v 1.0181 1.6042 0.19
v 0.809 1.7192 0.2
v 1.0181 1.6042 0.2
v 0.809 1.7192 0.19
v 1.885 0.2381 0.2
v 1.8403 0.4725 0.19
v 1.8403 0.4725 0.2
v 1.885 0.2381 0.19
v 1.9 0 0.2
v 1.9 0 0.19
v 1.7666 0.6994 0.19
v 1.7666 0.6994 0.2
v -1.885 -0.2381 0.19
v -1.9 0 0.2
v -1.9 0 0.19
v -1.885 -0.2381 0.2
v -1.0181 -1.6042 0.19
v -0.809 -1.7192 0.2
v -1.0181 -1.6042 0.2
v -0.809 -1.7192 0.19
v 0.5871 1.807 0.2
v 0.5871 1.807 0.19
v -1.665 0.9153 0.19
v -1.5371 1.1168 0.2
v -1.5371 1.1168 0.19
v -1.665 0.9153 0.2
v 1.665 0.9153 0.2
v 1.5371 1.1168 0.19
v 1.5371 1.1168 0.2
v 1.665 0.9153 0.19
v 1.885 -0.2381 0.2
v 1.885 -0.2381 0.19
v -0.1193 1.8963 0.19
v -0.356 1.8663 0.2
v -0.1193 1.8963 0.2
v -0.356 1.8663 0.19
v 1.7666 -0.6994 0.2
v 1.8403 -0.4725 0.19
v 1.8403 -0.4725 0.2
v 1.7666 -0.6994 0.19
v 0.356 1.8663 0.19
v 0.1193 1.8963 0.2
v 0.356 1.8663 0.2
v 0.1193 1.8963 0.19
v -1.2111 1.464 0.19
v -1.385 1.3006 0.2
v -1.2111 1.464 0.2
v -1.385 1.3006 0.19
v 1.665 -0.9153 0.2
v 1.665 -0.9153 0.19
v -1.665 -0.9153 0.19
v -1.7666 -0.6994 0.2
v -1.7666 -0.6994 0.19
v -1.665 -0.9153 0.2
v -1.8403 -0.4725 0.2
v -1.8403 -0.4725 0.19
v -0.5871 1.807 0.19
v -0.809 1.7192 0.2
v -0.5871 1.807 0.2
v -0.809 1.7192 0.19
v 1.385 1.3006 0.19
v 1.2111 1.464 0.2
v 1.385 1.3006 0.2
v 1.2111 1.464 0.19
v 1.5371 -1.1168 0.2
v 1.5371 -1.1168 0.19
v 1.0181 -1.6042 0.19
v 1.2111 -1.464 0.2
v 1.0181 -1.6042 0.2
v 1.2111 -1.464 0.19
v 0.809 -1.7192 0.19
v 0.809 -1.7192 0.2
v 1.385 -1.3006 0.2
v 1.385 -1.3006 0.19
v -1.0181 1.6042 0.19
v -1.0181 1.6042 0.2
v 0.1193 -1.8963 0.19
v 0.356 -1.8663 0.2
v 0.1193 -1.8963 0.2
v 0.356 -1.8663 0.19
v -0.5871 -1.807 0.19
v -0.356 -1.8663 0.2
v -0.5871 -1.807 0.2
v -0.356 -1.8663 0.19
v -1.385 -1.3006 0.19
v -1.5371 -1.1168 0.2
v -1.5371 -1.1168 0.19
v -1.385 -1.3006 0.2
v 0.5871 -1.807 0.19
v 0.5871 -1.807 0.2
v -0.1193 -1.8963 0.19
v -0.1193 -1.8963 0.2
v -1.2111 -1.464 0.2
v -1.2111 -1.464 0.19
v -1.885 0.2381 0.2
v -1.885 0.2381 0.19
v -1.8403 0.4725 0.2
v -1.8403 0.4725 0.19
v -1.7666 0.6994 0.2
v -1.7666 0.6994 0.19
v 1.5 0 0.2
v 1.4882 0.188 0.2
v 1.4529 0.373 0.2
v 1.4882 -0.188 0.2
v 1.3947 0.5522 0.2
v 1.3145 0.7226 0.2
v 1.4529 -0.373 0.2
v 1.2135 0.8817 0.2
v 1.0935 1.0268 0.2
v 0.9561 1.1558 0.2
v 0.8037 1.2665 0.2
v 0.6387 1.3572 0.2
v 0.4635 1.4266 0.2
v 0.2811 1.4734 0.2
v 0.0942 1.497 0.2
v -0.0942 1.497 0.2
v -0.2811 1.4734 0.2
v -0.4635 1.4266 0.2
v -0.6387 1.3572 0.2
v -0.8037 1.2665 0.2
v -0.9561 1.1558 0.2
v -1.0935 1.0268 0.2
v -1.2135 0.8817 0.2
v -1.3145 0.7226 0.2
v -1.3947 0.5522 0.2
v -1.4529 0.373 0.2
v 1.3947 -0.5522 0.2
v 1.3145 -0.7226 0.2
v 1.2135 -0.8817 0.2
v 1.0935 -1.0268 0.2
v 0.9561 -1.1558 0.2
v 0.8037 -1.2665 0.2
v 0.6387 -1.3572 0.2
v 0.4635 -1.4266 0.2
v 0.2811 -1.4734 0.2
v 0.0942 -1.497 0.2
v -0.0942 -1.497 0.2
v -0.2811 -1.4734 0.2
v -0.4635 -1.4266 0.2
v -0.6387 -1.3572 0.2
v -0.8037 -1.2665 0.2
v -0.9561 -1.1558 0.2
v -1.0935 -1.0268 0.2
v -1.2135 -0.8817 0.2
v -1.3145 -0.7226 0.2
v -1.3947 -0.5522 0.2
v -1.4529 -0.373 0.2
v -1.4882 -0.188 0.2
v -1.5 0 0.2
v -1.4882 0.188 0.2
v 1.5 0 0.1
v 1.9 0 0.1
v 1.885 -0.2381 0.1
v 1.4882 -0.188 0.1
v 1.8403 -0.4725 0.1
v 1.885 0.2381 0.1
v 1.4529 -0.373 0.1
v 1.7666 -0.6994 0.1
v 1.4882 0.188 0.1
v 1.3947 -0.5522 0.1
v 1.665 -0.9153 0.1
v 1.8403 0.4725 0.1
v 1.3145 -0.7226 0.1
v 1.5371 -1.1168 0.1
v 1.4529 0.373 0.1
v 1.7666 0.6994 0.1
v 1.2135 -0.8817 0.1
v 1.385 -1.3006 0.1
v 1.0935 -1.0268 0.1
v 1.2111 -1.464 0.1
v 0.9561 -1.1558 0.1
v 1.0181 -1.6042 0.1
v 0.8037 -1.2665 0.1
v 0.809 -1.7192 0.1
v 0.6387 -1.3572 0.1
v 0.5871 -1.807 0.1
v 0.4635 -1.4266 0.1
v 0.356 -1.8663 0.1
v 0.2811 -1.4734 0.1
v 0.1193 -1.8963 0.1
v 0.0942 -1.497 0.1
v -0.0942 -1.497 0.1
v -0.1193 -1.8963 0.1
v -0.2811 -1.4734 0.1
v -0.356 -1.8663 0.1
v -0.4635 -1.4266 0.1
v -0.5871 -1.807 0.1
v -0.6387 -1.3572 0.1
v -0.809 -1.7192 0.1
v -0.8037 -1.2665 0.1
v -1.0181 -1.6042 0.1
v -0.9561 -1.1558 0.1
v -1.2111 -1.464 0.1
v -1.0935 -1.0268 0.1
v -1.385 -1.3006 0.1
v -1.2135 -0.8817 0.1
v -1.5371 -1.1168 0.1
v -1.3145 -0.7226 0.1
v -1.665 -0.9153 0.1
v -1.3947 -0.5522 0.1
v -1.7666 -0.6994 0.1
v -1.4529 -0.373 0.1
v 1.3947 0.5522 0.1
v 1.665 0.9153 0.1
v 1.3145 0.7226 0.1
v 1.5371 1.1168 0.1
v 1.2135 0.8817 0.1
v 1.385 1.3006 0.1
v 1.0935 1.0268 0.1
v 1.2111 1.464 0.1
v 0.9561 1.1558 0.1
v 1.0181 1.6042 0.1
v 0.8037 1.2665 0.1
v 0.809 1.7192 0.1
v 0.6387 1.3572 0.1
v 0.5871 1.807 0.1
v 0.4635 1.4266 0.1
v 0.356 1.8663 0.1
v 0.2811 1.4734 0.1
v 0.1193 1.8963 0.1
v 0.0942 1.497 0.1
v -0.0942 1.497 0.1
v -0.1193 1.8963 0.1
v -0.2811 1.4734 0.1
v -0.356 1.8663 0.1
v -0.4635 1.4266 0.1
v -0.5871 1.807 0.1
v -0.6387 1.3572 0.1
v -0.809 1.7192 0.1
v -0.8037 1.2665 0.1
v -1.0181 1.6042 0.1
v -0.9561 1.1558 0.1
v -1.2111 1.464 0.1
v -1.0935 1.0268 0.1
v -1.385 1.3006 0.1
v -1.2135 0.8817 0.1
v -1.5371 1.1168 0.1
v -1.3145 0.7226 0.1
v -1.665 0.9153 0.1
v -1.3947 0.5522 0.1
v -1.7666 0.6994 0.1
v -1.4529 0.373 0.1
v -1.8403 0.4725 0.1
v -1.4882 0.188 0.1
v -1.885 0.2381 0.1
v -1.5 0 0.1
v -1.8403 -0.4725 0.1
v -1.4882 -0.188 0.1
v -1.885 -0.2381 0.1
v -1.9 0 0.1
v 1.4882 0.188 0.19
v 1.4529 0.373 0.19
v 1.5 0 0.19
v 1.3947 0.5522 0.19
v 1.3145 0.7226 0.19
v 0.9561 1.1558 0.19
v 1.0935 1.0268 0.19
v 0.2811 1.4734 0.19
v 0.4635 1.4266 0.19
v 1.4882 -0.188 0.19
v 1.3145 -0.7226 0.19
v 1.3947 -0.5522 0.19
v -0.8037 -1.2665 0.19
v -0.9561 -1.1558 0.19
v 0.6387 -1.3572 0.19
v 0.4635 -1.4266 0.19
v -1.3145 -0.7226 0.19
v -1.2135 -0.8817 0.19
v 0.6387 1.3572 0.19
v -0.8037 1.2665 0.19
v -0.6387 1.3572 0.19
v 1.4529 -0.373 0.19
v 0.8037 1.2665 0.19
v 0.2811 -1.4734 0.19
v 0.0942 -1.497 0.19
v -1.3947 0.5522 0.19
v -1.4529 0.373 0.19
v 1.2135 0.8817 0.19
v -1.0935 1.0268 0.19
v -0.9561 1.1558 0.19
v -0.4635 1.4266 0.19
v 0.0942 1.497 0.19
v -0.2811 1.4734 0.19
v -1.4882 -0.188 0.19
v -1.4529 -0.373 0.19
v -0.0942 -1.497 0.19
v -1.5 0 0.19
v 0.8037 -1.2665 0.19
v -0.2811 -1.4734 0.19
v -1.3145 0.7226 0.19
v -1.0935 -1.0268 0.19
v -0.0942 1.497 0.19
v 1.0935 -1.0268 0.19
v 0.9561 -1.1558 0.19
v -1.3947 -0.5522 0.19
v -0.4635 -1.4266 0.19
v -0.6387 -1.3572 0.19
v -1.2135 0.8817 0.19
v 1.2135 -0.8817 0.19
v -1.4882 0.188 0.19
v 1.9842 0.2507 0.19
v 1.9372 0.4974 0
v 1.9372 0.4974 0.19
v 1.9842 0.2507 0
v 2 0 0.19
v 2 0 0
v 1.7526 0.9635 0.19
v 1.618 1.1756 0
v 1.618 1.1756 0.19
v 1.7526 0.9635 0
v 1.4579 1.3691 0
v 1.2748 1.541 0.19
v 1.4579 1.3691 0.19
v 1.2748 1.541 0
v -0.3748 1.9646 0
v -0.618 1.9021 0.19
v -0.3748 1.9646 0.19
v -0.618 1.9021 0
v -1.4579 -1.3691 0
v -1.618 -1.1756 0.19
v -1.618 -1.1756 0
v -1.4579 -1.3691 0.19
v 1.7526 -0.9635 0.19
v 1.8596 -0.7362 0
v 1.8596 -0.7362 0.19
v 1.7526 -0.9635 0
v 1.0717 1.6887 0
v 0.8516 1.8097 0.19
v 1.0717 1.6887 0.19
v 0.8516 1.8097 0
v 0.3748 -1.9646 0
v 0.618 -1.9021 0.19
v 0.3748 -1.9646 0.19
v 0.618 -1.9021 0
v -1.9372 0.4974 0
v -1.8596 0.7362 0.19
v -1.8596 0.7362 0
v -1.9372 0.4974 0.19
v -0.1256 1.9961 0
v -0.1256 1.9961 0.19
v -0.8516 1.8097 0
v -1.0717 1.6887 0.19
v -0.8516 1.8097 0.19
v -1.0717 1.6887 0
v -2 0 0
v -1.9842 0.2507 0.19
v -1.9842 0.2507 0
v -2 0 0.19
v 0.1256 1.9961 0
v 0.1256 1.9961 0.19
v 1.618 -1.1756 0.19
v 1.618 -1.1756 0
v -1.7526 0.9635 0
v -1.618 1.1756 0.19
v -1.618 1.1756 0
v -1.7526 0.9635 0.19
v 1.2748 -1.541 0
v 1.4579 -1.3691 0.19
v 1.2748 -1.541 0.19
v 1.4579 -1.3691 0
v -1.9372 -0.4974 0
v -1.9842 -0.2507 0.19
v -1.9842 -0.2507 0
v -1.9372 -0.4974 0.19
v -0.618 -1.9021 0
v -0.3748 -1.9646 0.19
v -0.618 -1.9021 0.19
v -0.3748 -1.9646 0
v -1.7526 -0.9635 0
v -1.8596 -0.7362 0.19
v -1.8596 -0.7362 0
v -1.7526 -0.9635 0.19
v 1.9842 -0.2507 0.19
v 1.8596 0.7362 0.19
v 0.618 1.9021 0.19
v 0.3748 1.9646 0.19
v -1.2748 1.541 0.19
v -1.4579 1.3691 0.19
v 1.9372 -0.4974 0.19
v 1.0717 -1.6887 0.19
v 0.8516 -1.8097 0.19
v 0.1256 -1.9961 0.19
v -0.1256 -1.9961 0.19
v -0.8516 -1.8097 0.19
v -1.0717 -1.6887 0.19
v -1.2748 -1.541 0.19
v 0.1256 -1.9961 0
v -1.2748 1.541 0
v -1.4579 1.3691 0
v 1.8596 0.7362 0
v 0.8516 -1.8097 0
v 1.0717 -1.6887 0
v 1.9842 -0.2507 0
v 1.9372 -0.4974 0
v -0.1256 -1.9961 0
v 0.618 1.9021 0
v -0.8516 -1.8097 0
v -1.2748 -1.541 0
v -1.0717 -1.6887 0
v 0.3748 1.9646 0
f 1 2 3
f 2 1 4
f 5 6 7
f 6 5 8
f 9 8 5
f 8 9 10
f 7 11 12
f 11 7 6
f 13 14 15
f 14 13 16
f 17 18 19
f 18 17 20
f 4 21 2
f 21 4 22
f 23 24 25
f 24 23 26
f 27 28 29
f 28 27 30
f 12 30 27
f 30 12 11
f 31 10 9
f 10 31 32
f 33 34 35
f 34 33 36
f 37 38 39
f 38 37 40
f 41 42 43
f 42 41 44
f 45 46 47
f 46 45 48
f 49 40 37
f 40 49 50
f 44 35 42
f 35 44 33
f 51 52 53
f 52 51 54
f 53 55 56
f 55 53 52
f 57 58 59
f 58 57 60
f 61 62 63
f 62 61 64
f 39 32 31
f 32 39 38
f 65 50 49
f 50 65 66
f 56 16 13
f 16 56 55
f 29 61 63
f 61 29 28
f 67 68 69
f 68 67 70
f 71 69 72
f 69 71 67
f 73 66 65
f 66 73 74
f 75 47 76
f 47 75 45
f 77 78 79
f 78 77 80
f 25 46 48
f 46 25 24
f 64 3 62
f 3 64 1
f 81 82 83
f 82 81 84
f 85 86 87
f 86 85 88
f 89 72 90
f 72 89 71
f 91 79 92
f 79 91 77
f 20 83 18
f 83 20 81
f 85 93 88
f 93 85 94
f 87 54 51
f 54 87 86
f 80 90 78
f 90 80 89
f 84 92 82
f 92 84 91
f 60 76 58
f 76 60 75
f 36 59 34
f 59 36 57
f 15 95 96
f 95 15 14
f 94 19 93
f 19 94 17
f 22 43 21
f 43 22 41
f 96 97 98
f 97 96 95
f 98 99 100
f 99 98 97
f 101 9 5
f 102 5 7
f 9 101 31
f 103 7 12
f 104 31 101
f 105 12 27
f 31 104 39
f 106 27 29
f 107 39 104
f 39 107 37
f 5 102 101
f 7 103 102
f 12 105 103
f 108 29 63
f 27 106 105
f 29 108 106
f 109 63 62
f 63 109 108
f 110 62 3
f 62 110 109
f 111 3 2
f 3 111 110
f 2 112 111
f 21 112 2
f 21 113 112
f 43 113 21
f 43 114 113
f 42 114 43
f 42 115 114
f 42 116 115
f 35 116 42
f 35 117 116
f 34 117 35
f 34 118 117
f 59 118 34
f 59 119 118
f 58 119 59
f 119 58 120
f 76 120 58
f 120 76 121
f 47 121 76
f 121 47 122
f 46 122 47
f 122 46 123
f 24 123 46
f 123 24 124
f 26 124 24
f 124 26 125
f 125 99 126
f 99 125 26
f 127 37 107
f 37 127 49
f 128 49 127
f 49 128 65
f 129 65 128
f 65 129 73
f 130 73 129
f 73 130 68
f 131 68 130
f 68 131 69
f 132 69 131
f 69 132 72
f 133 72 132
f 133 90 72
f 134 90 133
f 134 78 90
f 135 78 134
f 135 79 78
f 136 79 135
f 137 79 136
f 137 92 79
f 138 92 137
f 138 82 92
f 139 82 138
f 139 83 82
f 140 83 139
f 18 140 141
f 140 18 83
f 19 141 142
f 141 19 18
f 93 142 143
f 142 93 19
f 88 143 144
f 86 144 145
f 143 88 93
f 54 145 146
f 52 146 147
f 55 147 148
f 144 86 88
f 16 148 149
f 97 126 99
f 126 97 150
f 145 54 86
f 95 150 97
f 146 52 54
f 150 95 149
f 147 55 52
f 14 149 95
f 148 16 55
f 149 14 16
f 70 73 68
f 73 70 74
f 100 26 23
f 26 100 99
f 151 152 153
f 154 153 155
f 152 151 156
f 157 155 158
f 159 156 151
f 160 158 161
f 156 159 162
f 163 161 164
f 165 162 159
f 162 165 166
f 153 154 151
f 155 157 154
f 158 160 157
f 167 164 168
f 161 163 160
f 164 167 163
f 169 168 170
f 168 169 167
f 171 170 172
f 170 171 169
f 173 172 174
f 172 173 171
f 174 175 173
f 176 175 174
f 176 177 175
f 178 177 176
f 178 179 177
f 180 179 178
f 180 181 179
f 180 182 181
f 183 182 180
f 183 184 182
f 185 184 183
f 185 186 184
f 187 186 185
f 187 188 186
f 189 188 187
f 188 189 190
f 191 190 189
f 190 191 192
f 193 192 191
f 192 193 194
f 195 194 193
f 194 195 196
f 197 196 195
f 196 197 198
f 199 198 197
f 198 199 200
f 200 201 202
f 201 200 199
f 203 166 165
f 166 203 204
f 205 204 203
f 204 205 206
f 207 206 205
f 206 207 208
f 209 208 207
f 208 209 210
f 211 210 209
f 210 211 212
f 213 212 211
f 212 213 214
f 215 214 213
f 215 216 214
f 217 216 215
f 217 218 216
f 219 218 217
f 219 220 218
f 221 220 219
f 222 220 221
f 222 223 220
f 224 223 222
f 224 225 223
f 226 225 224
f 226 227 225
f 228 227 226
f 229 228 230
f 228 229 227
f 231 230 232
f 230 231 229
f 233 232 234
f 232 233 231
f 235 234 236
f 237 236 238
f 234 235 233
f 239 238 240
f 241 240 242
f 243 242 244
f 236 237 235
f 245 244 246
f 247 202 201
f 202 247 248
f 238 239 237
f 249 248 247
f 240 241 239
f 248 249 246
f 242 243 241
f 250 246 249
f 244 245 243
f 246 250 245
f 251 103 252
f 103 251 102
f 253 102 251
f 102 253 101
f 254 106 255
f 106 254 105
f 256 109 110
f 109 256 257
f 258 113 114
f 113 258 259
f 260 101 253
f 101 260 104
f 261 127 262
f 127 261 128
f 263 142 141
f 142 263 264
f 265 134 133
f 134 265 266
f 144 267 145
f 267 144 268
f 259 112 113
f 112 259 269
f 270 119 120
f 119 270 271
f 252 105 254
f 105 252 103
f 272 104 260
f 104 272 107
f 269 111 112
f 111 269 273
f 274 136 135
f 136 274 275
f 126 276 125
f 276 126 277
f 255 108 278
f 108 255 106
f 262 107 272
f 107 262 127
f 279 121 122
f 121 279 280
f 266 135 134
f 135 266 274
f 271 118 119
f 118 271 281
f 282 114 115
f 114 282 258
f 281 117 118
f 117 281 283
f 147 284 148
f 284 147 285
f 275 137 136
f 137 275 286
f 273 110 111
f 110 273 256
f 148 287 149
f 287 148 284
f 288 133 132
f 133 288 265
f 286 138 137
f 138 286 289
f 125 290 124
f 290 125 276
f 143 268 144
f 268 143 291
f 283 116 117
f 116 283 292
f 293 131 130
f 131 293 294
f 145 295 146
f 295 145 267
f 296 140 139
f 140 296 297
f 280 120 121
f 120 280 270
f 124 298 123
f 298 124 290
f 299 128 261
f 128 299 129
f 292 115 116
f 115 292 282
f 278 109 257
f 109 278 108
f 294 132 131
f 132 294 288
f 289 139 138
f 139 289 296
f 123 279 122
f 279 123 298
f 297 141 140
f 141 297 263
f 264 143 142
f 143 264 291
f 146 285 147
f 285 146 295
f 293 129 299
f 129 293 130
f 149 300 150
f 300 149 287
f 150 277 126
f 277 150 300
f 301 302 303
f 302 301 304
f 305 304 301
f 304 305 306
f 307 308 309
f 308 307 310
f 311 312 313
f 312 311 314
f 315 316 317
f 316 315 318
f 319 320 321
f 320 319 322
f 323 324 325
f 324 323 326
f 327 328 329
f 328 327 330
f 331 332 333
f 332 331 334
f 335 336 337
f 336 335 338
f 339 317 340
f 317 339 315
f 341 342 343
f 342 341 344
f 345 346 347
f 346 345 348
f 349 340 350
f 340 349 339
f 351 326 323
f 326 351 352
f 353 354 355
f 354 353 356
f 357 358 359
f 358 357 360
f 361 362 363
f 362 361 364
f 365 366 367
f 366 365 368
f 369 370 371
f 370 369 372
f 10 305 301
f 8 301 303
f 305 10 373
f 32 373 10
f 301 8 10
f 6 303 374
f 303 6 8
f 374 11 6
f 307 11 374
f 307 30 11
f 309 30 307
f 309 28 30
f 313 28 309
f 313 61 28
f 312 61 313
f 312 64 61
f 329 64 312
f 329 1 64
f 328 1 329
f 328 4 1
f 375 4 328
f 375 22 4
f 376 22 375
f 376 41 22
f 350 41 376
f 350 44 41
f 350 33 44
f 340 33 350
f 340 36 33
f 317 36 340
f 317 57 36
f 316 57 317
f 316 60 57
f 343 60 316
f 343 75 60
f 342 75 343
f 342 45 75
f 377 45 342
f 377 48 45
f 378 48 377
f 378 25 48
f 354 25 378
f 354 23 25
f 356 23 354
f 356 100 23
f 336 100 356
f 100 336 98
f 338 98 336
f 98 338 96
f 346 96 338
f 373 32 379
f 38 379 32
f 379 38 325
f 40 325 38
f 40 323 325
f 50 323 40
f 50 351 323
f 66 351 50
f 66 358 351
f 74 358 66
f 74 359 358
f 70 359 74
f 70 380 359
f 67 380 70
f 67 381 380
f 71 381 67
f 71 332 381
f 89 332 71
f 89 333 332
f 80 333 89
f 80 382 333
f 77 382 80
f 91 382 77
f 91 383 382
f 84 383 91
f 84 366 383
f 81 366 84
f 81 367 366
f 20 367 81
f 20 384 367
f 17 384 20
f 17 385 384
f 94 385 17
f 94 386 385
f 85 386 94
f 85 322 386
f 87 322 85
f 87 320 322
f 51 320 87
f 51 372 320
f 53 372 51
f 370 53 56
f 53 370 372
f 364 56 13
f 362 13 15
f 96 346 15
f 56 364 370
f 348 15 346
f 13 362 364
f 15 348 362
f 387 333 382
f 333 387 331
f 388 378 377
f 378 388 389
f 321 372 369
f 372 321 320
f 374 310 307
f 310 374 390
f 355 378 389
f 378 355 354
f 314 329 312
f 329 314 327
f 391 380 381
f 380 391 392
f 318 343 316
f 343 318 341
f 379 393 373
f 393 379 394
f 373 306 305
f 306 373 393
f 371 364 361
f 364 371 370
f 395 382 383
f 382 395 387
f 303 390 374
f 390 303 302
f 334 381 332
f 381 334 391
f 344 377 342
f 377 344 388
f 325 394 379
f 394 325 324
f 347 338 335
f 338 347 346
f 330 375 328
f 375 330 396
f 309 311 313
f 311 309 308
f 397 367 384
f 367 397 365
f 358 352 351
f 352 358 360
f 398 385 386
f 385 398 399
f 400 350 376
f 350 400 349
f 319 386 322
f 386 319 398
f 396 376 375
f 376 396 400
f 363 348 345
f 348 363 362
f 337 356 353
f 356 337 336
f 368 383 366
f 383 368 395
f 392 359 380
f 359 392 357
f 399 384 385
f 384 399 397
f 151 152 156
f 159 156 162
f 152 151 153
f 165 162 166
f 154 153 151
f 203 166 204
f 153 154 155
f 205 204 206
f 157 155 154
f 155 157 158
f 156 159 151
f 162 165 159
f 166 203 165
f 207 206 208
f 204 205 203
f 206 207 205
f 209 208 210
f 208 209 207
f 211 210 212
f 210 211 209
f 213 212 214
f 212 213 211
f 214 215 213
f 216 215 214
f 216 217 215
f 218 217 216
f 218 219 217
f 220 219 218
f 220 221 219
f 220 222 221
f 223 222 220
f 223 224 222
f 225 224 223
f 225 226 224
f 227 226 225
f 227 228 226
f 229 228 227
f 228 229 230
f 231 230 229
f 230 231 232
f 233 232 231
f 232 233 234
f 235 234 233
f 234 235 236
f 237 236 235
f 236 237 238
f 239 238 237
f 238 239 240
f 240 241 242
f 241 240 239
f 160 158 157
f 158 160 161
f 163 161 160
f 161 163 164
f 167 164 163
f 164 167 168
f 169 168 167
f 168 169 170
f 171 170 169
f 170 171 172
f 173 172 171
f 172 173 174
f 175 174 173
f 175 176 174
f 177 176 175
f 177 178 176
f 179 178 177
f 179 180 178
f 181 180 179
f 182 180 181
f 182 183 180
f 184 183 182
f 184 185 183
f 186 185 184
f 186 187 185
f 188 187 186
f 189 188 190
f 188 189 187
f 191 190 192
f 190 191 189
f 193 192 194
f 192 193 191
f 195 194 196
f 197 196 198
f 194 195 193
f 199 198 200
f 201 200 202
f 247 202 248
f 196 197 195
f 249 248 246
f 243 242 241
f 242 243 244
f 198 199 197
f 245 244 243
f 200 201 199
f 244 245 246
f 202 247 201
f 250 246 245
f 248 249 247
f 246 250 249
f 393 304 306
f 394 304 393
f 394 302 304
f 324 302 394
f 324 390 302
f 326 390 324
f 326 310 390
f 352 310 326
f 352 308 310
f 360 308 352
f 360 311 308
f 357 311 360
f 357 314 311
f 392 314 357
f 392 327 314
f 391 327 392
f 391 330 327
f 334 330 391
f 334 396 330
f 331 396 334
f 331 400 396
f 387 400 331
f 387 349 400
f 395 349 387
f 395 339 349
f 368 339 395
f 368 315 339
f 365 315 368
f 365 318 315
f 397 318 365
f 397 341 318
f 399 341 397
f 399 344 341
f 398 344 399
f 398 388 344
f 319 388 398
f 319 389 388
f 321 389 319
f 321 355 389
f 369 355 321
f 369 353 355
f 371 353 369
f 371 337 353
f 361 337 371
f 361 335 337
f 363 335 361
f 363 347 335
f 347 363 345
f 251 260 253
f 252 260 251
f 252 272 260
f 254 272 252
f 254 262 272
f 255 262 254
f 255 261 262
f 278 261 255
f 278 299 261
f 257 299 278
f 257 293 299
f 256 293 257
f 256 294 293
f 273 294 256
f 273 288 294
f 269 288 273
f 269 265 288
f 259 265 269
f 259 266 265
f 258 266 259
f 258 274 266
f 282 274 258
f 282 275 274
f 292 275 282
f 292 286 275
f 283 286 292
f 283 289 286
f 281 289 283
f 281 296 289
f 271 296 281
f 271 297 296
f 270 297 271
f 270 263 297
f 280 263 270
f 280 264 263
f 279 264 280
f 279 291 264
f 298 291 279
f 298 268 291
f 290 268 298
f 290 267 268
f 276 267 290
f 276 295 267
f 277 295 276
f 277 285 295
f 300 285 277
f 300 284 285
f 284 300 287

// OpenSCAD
Red_Size = 1.5;

color("gray")
cylinder(h = 0.1, r1 = 2,r2 = 2,$fn = 50);
translate([0,0,0.1]

)
difference(){
    color("red")
    cylinder(h = 0.1, r1 = 1.9,r2 = 1.9,$fn = 50);
    cylinder(h = 0.2, r1 = 1.5,r2 = 1.5,$fn = 50);

}

translate([0,0,0.09])
difference(){
    color("white")
    cylinder(h = 0.1, r1 = 2,r2 = 2,$fn = 50);
    cylinder(h = 0.2, r1 = 1.9,r2 = 1.9,$fn = 50);
}

color("white")
translate([0,0,0.09])
cylinder(h = 0.1, r1 = 1.5,r2 = 1.5,$fn = 50);
